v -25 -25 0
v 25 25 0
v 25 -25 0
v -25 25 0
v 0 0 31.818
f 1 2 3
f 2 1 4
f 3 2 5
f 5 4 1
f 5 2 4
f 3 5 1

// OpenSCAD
// desc     | Louvre a=35m | Herodot:          | Cheops      | Chephren
//          | h_p=21.6m    | h_p²=h_s*a/2      | (440/280)   | (410/275)
//          |              |                   | a=230.33m   | a=215.29m
//          |              |                   | h_p=146.59m | h_p=143.87
// ---------+--------------+-------------------+-------------+--------------
// phi      | 50.99        | 51.82             | 51.84       | 53.30
// k (edge) | 0.94 * a     | a*sqrt(sqrt(5)+5))| 0.96 * a    | 0.97 * a
//          |              | /sqrt(8)          |             |
// h_s      | 0.79 * a     | a*sqrt(sqrt(5)+3))| 0.82 * a    | 0.84 * a
//          |              | /sqrt(8)          |             |
// h_p      | 0.62 * a     | a*sqrt(sqrt(5)+1))| 0.64 * a    | 0.67 * a
//          |              | /sqrt(8)          |             |

// desc  | equilateral | equilateral | h_p=a       | equilateral |  max V(A)   
//       | triangle    | from side   |             | over edge   |             
//-------+-------------+-------------+-------------+-------------+-------------
// phi   | 54.74       | 60          | 63.43       | 67.79       | 70.53       
//k(edge)| a           | a*sqrt(5)/2 | a*sqrt(3/2) | a*sqrt(2)   | a*sqrt(5/2) 
// h_s   | a*sqrt(3)/2 | a           | a*sqrt(5)/2 | a*sqrt(7)/2 | a*3/2       
// h_p   | a*sqrt(2)/2 | a*sqrt(3)/2 | a           | a*sqrt(3/2) | a*sqrt(2)   

// Cheops:  2620 - 2580 b.C.
// Herodot:  490 -  424 b.C. (about)

// a: length of side
// h_a: height (h_p in table above) in units of a
module pyramid (a, h_a)
{
    phi = atan (2*h_a);
    dphi = 90 - phi;
    //echo (phi);
    difference () {
        translate ([0, 0, 1.5*a])
            cube ([a, a, 3*a], center = true);
        translate ([a/2, 0, 0])
            rotate ([0, -dphi, 0])
                translate ([2*a, 0, 4*a])
                    cube ([4*a, 4*a, 8*a], center = true);
        translate ([-a/2, 0, 0])
            rotate ([0, dphi, 0])
                translate ([-2*a, 0, 4*a])
                    cube ([4*a, 4*a, 8*a], center = true);
        translate ([0, a/2, 0])
            rotate ([dphi, 0, 0])
                translate ([0, 2*a, 4*a])
                    cube ([4*a, 4*a, 8*a], center = true);
        translate ([0, -a/2, 0])
            rotate ([-dphi, 0, 0])
                translate ([0, -2*a, 4*a])
                    cube ([4*a, 4*a, 8*a], center = true);
    }
}

pyramid (50, 7/11);          // Cheops
//pyramid (50, 55/82);        // Chephren
//pyramid (50, sqrt (2) / 2); // equilateral triangle
//pyramid (50, sqrt (3) / 2); // equilateral seen from side
//pyramid (50, 1.0);          // a=h
//pyramid (50, sqrt (3 / 2)); // equilateral seen from edge
//pyramid (50, sqrt (2));     // max volume
